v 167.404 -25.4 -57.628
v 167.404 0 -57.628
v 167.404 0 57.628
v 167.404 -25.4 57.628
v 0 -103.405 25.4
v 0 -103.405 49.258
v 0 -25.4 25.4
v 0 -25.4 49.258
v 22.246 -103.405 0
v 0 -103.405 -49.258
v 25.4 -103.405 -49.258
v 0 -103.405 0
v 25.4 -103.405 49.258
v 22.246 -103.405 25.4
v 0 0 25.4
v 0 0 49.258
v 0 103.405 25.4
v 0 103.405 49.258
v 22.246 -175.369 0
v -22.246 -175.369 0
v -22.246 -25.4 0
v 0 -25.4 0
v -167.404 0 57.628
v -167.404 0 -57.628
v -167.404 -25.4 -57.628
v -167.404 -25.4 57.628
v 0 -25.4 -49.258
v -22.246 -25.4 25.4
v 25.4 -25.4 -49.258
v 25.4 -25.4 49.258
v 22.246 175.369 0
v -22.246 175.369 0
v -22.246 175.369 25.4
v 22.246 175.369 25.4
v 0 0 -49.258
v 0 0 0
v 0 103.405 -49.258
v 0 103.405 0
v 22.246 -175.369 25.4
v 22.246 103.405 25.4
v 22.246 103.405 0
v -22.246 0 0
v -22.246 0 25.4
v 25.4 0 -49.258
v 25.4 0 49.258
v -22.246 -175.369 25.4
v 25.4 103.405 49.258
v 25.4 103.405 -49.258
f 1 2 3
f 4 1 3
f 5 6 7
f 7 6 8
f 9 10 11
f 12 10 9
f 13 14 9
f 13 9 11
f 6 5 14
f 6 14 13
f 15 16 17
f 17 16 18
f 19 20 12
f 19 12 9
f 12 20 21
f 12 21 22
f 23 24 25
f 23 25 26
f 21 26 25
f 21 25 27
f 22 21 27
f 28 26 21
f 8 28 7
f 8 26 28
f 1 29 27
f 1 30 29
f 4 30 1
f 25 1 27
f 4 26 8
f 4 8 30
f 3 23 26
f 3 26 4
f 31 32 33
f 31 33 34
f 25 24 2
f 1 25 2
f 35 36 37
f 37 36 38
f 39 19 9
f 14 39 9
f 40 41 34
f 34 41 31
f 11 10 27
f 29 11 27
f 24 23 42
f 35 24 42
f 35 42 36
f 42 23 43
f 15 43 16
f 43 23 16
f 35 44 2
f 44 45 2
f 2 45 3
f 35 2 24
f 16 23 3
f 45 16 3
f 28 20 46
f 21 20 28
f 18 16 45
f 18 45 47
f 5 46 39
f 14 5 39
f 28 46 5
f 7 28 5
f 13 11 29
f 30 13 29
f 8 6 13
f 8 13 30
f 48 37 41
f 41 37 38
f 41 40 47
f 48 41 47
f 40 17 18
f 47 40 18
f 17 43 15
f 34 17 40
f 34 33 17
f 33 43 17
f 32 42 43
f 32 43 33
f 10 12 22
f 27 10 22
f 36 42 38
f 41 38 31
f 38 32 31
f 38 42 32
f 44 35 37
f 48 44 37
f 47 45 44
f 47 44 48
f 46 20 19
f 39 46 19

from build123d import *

# Parameters (mm, degrees)
F0_W     = 206.809192
F0_H     = 98.516002
F3_DEPTH = 25.4
F1_W     = 334.808738
F1_H     = 115.25692
F4_DEPTH = 25.4
F2_W     = 44.491924
F2_H     = 350.738764
F5_DEPTH = 25.4


with BuildPart() as f3:
    # F0 (on Right) → F3 (new body)
    with BuildSketch(Plane.YZ):
        Rectangle(F0_W, F0_H)
    extrude(amount=F3_DEPTH)

    # F1 (on Front) → F4 (join)
    with BuildSketch(Plane.XZ):
        Rectangle(F1_W, F1_H)
    extrude(amount=F4_DEPTH)

    # F2 (on Top) → F5 (join)
    with BuildSketch(Plane.XY):
        Rectangle(F2_W, F2_H)
    extrude(amount=F5_DEPTH)


solid = f3.part
